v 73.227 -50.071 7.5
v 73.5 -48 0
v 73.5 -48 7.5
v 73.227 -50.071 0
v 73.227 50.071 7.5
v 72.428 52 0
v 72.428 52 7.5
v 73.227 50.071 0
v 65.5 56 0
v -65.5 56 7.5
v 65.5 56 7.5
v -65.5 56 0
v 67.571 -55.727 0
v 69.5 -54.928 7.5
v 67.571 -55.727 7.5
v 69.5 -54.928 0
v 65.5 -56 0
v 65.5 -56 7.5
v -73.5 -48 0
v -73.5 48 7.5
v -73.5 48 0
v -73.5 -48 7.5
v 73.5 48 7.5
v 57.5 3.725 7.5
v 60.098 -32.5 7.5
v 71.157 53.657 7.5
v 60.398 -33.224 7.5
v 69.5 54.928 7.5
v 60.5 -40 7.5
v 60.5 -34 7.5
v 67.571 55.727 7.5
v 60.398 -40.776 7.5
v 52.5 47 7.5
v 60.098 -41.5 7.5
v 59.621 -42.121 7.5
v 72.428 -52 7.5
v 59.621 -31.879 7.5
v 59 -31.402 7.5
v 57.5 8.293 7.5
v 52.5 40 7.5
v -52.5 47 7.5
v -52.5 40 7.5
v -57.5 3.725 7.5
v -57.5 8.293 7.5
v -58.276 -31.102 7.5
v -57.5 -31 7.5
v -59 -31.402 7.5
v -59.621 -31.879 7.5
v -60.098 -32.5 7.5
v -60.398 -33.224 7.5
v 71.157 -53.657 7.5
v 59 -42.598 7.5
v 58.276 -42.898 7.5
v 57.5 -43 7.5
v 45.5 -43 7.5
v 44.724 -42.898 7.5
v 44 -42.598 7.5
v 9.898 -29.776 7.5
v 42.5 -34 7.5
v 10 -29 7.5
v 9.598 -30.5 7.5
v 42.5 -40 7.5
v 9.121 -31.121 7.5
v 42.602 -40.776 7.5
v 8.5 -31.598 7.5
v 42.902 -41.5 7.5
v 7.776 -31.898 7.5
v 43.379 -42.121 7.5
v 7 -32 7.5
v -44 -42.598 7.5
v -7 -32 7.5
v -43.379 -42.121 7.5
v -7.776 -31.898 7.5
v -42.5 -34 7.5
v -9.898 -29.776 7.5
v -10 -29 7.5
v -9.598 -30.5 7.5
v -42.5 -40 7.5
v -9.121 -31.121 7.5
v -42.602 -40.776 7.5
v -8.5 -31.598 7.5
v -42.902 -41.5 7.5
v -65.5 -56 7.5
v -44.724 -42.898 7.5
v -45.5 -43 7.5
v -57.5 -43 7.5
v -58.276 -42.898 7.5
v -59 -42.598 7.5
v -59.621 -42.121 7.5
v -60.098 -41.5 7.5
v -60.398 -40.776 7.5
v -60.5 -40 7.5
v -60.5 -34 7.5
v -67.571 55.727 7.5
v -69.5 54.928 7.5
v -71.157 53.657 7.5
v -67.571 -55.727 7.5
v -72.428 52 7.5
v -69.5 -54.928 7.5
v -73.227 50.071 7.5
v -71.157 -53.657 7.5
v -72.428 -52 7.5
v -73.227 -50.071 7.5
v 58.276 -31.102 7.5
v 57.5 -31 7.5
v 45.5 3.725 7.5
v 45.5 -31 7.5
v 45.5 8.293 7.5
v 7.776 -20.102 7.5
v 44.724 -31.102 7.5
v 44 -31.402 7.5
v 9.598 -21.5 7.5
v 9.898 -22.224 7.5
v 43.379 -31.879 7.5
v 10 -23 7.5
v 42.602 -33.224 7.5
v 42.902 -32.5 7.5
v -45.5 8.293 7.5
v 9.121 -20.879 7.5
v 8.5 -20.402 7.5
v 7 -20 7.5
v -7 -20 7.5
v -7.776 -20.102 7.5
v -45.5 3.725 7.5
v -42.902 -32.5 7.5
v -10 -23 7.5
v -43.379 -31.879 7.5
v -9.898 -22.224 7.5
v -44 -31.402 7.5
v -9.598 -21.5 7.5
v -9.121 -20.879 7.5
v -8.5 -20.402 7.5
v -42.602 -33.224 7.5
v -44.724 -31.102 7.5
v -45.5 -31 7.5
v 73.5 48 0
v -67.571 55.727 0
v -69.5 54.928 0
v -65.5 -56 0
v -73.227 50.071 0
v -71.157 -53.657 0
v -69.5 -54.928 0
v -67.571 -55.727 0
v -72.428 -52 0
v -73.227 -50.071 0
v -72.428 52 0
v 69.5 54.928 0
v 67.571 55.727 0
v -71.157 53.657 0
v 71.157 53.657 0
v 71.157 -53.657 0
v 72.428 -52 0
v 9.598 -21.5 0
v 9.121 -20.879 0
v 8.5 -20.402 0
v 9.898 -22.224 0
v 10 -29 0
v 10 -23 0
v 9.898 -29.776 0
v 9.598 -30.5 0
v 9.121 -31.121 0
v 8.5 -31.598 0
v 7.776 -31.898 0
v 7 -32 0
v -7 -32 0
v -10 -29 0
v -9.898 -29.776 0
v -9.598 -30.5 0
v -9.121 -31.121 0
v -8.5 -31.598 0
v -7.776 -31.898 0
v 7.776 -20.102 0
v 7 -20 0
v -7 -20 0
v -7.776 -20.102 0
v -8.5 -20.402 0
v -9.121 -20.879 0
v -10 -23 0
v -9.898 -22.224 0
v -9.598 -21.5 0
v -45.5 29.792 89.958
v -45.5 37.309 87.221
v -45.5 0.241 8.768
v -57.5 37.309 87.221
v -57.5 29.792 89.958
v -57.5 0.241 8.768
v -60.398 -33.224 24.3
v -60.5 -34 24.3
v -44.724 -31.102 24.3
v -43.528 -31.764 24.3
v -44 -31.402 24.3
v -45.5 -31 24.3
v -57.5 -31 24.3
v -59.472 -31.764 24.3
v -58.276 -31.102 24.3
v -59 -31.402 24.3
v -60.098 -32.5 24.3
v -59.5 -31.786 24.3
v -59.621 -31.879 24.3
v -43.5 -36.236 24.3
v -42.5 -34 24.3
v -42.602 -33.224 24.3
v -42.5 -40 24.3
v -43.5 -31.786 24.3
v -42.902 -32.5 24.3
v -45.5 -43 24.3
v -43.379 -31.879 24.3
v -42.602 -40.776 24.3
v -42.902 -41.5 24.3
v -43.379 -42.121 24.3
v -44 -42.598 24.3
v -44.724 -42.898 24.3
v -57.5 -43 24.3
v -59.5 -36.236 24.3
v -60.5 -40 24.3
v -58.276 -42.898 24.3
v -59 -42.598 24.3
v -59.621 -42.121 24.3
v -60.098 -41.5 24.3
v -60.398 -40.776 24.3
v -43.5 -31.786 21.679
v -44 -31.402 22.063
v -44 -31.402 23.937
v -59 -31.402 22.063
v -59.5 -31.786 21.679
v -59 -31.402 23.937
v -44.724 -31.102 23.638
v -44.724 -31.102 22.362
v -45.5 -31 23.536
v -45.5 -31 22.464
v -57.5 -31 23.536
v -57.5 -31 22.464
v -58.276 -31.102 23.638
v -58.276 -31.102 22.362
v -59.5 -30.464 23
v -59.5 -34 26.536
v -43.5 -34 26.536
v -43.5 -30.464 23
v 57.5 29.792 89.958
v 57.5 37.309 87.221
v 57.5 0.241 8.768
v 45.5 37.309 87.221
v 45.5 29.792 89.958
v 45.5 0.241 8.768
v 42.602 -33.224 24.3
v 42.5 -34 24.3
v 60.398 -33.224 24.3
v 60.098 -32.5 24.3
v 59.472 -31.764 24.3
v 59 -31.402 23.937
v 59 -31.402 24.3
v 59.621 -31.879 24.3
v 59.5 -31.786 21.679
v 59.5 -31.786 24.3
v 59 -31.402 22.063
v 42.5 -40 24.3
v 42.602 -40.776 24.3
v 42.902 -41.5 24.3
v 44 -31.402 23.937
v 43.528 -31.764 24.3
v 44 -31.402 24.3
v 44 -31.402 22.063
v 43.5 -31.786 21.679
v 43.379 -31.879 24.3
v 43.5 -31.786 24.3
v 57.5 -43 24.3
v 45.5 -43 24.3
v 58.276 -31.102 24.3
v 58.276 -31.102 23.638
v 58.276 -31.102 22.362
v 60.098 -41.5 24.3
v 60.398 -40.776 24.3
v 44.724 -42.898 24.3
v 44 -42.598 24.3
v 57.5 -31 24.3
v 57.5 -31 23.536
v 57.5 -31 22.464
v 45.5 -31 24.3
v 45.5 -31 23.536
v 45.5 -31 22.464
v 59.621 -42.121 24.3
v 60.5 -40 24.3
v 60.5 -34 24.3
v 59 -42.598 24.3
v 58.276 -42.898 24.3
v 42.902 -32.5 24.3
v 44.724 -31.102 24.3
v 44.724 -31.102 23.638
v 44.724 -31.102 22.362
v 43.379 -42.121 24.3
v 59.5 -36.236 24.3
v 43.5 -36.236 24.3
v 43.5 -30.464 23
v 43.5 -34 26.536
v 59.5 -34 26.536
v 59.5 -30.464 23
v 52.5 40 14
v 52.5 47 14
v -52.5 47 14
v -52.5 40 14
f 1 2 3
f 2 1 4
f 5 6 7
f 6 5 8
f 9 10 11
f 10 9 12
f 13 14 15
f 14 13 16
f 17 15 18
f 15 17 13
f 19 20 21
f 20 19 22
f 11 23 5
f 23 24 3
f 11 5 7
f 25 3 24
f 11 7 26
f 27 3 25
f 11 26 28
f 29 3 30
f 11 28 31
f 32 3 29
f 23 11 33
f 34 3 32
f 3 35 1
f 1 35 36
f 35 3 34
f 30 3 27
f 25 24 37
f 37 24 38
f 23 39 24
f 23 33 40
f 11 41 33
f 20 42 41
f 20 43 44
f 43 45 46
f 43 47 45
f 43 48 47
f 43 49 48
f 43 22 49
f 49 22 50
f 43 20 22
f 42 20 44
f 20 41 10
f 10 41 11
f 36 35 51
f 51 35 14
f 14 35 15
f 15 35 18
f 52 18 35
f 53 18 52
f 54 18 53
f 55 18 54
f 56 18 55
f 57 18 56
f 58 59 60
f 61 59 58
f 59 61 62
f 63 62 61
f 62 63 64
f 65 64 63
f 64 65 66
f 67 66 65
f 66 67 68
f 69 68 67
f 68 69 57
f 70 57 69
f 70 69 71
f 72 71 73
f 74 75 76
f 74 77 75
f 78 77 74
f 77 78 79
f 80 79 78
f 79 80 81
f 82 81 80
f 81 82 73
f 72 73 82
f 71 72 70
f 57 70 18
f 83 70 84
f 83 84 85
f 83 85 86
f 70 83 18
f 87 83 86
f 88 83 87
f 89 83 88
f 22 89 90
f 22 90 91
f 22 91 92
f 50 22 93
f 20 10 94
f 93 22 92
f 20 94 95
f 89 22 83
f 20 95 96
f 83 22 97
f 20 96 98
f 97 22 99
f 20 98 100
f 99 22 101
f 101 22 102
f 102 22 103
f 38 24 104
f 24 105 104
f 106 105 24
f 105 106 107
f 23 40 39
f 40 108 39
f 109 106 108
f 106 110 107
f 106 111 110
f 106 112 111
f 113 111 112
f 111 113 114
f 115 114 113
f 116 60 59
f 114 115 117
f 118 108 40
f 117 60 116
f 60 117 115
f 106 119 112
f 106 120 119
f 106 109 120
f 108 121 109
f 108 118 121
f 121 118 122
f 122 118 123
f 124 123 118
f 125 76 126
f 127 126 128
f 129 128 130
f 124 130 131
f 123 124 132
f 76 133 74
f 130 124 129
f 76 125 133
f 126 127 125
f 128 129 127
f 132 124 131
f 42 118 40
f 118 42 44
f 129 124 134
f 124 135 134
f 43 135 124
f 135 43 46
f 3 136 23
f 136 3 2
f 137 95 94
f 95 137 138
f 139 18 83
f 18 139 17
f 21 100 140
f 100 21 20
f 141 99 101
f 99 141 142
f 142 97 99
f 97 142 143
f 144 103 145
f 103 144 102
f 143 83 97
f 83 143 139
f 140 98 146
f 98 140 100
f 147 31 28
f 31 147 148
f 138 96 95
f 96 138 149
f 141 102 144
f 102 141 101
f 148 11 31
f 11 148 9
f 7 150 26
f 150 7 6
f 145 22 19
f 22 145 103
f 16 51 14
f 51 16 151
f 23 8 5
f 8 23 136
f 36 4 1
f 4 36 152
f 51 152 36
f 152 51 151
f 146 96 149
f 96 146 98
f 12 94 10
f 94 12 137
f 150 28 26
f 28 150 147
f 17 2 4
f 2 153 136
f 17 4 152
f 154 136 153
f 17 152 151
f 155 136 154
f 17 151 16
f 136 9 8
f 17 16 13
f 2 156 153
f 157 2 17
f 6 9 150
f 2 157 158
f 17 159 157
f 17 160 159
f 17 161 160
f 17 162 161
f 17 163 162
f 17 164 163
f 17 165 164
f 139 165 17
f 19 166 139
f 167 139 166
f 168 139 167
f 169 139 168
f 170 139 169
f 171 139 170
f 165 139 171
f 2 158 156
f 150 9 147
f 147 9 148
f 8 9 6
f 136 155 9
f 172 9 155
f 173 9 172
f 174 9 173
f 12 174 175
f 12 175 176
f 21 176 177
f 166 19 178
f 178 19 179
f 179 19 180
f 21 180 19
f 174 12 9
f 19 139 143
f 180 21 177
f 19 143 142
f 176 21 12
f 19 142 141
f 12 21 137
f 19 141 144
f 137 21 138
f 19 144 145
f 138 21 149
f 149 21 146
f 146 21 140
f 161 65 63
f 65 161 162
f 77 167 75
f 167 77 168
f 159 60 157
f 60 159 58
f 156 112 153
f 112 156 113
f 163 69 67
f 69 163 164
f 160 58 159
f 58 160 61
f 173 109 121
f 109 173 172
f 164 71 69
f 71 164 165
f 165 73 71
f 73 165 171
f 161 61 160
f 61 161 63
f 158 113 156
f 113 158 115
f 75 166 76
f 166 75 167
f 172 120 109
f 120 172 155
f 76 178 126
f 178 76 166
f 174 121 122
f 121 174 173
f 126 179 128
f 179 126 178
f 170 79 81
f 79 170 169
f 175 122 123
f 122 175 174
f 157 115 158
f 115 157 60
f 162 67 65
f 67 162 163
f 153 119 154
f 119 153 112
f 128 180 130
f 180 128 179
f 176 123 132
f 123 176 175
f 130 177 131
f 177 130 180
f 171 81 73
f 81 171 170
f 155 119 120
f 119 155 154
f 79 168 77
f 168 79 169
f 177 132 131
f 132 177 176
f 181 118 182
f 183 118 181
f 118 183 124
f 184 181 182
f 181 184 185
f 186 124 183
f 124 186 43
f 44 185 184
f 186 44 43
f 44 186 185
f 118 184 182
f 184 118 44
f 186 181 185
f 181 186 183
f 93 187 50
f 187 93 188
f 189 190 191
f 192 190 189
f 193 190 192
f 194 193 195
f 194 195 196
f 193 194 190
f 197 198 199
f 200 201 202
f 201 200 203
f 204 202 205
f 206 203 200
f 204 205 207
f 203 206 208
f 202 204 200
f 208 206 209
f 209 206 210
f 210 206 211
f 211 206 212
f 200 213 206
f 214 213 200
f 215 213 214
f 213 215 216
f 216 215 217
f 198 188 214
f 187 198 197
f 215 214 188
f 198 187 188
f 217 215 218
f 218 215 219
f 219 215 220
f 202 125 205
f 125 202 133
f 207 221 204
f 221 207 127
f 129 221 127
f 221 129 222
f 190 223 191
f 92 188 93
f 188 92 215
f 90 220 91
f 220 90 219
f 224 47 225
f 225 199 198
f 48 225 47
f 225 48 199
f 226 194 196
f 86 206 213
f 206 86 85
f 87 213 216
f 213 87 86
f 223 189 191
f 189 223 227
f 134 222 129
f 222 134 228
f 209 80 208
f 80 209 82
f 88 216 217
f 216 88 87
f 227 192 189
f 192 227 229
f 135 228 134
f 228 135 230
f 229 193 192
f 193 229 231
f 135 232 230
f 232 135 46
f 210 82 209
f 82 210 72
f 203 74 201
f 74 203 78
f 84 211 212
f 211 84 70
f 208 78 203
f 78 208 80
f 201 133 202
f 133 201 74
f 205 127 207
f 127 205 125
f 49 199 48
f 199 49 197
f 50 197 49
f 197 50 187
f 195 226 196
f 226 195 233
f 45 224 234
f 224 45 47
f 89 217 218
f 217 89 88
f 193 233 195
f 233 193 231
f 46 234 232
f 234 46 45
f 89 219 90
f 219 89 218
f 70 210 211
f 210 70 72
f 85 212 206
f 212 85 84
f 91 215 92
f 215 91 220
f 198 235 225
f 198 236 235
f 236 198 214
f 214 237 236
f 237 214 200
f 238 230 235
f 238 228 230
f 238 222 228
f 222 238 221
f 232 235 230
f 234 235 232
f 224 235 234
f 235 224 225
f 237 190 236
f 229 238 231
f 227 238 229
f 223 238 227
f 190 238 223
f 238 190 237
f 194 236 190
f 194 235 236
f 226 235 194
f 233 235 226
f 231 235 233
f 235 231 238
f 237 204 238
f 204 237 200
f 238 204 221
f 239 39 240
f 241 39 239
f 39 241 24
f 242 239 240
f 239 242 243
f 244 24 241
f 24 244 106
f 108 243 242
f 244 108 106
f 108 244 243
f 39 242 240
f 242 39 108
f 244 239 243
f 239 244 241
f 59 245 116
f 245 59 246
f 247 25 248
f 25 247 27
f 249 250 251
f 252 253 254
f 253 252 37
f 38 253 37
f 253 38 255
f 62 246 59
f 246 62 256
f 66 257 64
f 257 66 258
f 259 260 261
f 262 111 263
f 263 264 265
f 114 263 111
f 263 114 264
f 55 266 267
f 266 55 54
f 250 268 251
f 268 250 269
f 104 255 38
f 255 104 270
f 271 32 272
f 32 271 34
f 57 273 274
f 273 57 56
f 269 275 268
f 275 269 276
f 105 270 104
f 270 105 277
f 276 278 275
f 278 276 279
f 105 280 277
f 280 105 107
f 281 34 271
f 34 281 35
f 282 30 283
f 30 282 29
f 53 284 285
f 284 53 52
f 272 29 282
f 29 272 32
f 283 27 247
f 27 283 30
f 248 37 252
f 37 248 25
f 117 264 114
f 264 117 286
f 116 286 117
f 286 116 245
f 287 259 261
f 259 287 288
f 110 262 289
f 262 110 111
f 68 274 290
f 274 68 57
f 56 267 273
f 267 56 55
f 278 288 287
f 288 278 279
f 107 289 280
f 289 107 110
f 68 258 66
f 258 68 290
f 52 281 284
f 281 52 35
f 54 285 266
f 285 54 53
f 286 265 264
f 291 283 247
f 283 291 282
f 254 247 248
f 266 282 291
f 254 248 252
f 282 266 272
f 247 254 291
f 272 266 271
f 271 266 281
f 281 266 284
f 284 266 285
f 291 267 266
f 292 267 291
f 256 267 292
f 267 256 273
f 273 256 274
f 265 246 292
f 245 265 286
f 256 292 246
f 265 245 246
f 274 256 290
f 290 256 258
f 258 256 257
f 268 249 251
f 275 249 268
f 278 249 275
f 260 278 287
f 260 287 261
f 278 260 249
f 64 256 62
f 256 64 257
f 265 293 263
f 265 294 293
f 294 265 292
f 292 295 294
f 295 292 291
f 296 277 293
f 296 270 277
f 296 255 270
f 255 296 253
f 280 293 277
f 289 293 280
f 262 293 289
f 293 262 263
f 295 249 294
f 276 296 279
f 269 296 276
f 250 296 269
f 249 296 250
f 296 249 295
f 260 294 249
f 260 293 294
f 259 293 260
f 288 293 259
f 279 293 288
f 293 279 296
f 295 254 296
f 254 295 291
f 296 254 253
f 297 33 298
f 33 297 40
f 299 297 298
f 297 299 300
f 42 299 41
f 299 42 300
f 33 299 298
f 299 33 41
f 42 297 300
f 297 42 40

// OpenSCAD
// SPDX-License-Identifier: MIT
// Handheld Console Stand | Refined batch 01 | OpenSCAD mm/Z-up.
// Prototype: slicer, fit, material, stability and safety remain UNVERIFIED.
use <lib/commerce_forms.scad> // v1.3 compatibility; other SKUs retain their original template.
use <lib/refined_forms.scad>
width_mm = 147;
depth_mm = 112;
height_mm = 90;
refined_form(slug="handheld-console-stand", family="gaming", variant=5, w=width_mm, d=depth_mm, h=height_mm);
